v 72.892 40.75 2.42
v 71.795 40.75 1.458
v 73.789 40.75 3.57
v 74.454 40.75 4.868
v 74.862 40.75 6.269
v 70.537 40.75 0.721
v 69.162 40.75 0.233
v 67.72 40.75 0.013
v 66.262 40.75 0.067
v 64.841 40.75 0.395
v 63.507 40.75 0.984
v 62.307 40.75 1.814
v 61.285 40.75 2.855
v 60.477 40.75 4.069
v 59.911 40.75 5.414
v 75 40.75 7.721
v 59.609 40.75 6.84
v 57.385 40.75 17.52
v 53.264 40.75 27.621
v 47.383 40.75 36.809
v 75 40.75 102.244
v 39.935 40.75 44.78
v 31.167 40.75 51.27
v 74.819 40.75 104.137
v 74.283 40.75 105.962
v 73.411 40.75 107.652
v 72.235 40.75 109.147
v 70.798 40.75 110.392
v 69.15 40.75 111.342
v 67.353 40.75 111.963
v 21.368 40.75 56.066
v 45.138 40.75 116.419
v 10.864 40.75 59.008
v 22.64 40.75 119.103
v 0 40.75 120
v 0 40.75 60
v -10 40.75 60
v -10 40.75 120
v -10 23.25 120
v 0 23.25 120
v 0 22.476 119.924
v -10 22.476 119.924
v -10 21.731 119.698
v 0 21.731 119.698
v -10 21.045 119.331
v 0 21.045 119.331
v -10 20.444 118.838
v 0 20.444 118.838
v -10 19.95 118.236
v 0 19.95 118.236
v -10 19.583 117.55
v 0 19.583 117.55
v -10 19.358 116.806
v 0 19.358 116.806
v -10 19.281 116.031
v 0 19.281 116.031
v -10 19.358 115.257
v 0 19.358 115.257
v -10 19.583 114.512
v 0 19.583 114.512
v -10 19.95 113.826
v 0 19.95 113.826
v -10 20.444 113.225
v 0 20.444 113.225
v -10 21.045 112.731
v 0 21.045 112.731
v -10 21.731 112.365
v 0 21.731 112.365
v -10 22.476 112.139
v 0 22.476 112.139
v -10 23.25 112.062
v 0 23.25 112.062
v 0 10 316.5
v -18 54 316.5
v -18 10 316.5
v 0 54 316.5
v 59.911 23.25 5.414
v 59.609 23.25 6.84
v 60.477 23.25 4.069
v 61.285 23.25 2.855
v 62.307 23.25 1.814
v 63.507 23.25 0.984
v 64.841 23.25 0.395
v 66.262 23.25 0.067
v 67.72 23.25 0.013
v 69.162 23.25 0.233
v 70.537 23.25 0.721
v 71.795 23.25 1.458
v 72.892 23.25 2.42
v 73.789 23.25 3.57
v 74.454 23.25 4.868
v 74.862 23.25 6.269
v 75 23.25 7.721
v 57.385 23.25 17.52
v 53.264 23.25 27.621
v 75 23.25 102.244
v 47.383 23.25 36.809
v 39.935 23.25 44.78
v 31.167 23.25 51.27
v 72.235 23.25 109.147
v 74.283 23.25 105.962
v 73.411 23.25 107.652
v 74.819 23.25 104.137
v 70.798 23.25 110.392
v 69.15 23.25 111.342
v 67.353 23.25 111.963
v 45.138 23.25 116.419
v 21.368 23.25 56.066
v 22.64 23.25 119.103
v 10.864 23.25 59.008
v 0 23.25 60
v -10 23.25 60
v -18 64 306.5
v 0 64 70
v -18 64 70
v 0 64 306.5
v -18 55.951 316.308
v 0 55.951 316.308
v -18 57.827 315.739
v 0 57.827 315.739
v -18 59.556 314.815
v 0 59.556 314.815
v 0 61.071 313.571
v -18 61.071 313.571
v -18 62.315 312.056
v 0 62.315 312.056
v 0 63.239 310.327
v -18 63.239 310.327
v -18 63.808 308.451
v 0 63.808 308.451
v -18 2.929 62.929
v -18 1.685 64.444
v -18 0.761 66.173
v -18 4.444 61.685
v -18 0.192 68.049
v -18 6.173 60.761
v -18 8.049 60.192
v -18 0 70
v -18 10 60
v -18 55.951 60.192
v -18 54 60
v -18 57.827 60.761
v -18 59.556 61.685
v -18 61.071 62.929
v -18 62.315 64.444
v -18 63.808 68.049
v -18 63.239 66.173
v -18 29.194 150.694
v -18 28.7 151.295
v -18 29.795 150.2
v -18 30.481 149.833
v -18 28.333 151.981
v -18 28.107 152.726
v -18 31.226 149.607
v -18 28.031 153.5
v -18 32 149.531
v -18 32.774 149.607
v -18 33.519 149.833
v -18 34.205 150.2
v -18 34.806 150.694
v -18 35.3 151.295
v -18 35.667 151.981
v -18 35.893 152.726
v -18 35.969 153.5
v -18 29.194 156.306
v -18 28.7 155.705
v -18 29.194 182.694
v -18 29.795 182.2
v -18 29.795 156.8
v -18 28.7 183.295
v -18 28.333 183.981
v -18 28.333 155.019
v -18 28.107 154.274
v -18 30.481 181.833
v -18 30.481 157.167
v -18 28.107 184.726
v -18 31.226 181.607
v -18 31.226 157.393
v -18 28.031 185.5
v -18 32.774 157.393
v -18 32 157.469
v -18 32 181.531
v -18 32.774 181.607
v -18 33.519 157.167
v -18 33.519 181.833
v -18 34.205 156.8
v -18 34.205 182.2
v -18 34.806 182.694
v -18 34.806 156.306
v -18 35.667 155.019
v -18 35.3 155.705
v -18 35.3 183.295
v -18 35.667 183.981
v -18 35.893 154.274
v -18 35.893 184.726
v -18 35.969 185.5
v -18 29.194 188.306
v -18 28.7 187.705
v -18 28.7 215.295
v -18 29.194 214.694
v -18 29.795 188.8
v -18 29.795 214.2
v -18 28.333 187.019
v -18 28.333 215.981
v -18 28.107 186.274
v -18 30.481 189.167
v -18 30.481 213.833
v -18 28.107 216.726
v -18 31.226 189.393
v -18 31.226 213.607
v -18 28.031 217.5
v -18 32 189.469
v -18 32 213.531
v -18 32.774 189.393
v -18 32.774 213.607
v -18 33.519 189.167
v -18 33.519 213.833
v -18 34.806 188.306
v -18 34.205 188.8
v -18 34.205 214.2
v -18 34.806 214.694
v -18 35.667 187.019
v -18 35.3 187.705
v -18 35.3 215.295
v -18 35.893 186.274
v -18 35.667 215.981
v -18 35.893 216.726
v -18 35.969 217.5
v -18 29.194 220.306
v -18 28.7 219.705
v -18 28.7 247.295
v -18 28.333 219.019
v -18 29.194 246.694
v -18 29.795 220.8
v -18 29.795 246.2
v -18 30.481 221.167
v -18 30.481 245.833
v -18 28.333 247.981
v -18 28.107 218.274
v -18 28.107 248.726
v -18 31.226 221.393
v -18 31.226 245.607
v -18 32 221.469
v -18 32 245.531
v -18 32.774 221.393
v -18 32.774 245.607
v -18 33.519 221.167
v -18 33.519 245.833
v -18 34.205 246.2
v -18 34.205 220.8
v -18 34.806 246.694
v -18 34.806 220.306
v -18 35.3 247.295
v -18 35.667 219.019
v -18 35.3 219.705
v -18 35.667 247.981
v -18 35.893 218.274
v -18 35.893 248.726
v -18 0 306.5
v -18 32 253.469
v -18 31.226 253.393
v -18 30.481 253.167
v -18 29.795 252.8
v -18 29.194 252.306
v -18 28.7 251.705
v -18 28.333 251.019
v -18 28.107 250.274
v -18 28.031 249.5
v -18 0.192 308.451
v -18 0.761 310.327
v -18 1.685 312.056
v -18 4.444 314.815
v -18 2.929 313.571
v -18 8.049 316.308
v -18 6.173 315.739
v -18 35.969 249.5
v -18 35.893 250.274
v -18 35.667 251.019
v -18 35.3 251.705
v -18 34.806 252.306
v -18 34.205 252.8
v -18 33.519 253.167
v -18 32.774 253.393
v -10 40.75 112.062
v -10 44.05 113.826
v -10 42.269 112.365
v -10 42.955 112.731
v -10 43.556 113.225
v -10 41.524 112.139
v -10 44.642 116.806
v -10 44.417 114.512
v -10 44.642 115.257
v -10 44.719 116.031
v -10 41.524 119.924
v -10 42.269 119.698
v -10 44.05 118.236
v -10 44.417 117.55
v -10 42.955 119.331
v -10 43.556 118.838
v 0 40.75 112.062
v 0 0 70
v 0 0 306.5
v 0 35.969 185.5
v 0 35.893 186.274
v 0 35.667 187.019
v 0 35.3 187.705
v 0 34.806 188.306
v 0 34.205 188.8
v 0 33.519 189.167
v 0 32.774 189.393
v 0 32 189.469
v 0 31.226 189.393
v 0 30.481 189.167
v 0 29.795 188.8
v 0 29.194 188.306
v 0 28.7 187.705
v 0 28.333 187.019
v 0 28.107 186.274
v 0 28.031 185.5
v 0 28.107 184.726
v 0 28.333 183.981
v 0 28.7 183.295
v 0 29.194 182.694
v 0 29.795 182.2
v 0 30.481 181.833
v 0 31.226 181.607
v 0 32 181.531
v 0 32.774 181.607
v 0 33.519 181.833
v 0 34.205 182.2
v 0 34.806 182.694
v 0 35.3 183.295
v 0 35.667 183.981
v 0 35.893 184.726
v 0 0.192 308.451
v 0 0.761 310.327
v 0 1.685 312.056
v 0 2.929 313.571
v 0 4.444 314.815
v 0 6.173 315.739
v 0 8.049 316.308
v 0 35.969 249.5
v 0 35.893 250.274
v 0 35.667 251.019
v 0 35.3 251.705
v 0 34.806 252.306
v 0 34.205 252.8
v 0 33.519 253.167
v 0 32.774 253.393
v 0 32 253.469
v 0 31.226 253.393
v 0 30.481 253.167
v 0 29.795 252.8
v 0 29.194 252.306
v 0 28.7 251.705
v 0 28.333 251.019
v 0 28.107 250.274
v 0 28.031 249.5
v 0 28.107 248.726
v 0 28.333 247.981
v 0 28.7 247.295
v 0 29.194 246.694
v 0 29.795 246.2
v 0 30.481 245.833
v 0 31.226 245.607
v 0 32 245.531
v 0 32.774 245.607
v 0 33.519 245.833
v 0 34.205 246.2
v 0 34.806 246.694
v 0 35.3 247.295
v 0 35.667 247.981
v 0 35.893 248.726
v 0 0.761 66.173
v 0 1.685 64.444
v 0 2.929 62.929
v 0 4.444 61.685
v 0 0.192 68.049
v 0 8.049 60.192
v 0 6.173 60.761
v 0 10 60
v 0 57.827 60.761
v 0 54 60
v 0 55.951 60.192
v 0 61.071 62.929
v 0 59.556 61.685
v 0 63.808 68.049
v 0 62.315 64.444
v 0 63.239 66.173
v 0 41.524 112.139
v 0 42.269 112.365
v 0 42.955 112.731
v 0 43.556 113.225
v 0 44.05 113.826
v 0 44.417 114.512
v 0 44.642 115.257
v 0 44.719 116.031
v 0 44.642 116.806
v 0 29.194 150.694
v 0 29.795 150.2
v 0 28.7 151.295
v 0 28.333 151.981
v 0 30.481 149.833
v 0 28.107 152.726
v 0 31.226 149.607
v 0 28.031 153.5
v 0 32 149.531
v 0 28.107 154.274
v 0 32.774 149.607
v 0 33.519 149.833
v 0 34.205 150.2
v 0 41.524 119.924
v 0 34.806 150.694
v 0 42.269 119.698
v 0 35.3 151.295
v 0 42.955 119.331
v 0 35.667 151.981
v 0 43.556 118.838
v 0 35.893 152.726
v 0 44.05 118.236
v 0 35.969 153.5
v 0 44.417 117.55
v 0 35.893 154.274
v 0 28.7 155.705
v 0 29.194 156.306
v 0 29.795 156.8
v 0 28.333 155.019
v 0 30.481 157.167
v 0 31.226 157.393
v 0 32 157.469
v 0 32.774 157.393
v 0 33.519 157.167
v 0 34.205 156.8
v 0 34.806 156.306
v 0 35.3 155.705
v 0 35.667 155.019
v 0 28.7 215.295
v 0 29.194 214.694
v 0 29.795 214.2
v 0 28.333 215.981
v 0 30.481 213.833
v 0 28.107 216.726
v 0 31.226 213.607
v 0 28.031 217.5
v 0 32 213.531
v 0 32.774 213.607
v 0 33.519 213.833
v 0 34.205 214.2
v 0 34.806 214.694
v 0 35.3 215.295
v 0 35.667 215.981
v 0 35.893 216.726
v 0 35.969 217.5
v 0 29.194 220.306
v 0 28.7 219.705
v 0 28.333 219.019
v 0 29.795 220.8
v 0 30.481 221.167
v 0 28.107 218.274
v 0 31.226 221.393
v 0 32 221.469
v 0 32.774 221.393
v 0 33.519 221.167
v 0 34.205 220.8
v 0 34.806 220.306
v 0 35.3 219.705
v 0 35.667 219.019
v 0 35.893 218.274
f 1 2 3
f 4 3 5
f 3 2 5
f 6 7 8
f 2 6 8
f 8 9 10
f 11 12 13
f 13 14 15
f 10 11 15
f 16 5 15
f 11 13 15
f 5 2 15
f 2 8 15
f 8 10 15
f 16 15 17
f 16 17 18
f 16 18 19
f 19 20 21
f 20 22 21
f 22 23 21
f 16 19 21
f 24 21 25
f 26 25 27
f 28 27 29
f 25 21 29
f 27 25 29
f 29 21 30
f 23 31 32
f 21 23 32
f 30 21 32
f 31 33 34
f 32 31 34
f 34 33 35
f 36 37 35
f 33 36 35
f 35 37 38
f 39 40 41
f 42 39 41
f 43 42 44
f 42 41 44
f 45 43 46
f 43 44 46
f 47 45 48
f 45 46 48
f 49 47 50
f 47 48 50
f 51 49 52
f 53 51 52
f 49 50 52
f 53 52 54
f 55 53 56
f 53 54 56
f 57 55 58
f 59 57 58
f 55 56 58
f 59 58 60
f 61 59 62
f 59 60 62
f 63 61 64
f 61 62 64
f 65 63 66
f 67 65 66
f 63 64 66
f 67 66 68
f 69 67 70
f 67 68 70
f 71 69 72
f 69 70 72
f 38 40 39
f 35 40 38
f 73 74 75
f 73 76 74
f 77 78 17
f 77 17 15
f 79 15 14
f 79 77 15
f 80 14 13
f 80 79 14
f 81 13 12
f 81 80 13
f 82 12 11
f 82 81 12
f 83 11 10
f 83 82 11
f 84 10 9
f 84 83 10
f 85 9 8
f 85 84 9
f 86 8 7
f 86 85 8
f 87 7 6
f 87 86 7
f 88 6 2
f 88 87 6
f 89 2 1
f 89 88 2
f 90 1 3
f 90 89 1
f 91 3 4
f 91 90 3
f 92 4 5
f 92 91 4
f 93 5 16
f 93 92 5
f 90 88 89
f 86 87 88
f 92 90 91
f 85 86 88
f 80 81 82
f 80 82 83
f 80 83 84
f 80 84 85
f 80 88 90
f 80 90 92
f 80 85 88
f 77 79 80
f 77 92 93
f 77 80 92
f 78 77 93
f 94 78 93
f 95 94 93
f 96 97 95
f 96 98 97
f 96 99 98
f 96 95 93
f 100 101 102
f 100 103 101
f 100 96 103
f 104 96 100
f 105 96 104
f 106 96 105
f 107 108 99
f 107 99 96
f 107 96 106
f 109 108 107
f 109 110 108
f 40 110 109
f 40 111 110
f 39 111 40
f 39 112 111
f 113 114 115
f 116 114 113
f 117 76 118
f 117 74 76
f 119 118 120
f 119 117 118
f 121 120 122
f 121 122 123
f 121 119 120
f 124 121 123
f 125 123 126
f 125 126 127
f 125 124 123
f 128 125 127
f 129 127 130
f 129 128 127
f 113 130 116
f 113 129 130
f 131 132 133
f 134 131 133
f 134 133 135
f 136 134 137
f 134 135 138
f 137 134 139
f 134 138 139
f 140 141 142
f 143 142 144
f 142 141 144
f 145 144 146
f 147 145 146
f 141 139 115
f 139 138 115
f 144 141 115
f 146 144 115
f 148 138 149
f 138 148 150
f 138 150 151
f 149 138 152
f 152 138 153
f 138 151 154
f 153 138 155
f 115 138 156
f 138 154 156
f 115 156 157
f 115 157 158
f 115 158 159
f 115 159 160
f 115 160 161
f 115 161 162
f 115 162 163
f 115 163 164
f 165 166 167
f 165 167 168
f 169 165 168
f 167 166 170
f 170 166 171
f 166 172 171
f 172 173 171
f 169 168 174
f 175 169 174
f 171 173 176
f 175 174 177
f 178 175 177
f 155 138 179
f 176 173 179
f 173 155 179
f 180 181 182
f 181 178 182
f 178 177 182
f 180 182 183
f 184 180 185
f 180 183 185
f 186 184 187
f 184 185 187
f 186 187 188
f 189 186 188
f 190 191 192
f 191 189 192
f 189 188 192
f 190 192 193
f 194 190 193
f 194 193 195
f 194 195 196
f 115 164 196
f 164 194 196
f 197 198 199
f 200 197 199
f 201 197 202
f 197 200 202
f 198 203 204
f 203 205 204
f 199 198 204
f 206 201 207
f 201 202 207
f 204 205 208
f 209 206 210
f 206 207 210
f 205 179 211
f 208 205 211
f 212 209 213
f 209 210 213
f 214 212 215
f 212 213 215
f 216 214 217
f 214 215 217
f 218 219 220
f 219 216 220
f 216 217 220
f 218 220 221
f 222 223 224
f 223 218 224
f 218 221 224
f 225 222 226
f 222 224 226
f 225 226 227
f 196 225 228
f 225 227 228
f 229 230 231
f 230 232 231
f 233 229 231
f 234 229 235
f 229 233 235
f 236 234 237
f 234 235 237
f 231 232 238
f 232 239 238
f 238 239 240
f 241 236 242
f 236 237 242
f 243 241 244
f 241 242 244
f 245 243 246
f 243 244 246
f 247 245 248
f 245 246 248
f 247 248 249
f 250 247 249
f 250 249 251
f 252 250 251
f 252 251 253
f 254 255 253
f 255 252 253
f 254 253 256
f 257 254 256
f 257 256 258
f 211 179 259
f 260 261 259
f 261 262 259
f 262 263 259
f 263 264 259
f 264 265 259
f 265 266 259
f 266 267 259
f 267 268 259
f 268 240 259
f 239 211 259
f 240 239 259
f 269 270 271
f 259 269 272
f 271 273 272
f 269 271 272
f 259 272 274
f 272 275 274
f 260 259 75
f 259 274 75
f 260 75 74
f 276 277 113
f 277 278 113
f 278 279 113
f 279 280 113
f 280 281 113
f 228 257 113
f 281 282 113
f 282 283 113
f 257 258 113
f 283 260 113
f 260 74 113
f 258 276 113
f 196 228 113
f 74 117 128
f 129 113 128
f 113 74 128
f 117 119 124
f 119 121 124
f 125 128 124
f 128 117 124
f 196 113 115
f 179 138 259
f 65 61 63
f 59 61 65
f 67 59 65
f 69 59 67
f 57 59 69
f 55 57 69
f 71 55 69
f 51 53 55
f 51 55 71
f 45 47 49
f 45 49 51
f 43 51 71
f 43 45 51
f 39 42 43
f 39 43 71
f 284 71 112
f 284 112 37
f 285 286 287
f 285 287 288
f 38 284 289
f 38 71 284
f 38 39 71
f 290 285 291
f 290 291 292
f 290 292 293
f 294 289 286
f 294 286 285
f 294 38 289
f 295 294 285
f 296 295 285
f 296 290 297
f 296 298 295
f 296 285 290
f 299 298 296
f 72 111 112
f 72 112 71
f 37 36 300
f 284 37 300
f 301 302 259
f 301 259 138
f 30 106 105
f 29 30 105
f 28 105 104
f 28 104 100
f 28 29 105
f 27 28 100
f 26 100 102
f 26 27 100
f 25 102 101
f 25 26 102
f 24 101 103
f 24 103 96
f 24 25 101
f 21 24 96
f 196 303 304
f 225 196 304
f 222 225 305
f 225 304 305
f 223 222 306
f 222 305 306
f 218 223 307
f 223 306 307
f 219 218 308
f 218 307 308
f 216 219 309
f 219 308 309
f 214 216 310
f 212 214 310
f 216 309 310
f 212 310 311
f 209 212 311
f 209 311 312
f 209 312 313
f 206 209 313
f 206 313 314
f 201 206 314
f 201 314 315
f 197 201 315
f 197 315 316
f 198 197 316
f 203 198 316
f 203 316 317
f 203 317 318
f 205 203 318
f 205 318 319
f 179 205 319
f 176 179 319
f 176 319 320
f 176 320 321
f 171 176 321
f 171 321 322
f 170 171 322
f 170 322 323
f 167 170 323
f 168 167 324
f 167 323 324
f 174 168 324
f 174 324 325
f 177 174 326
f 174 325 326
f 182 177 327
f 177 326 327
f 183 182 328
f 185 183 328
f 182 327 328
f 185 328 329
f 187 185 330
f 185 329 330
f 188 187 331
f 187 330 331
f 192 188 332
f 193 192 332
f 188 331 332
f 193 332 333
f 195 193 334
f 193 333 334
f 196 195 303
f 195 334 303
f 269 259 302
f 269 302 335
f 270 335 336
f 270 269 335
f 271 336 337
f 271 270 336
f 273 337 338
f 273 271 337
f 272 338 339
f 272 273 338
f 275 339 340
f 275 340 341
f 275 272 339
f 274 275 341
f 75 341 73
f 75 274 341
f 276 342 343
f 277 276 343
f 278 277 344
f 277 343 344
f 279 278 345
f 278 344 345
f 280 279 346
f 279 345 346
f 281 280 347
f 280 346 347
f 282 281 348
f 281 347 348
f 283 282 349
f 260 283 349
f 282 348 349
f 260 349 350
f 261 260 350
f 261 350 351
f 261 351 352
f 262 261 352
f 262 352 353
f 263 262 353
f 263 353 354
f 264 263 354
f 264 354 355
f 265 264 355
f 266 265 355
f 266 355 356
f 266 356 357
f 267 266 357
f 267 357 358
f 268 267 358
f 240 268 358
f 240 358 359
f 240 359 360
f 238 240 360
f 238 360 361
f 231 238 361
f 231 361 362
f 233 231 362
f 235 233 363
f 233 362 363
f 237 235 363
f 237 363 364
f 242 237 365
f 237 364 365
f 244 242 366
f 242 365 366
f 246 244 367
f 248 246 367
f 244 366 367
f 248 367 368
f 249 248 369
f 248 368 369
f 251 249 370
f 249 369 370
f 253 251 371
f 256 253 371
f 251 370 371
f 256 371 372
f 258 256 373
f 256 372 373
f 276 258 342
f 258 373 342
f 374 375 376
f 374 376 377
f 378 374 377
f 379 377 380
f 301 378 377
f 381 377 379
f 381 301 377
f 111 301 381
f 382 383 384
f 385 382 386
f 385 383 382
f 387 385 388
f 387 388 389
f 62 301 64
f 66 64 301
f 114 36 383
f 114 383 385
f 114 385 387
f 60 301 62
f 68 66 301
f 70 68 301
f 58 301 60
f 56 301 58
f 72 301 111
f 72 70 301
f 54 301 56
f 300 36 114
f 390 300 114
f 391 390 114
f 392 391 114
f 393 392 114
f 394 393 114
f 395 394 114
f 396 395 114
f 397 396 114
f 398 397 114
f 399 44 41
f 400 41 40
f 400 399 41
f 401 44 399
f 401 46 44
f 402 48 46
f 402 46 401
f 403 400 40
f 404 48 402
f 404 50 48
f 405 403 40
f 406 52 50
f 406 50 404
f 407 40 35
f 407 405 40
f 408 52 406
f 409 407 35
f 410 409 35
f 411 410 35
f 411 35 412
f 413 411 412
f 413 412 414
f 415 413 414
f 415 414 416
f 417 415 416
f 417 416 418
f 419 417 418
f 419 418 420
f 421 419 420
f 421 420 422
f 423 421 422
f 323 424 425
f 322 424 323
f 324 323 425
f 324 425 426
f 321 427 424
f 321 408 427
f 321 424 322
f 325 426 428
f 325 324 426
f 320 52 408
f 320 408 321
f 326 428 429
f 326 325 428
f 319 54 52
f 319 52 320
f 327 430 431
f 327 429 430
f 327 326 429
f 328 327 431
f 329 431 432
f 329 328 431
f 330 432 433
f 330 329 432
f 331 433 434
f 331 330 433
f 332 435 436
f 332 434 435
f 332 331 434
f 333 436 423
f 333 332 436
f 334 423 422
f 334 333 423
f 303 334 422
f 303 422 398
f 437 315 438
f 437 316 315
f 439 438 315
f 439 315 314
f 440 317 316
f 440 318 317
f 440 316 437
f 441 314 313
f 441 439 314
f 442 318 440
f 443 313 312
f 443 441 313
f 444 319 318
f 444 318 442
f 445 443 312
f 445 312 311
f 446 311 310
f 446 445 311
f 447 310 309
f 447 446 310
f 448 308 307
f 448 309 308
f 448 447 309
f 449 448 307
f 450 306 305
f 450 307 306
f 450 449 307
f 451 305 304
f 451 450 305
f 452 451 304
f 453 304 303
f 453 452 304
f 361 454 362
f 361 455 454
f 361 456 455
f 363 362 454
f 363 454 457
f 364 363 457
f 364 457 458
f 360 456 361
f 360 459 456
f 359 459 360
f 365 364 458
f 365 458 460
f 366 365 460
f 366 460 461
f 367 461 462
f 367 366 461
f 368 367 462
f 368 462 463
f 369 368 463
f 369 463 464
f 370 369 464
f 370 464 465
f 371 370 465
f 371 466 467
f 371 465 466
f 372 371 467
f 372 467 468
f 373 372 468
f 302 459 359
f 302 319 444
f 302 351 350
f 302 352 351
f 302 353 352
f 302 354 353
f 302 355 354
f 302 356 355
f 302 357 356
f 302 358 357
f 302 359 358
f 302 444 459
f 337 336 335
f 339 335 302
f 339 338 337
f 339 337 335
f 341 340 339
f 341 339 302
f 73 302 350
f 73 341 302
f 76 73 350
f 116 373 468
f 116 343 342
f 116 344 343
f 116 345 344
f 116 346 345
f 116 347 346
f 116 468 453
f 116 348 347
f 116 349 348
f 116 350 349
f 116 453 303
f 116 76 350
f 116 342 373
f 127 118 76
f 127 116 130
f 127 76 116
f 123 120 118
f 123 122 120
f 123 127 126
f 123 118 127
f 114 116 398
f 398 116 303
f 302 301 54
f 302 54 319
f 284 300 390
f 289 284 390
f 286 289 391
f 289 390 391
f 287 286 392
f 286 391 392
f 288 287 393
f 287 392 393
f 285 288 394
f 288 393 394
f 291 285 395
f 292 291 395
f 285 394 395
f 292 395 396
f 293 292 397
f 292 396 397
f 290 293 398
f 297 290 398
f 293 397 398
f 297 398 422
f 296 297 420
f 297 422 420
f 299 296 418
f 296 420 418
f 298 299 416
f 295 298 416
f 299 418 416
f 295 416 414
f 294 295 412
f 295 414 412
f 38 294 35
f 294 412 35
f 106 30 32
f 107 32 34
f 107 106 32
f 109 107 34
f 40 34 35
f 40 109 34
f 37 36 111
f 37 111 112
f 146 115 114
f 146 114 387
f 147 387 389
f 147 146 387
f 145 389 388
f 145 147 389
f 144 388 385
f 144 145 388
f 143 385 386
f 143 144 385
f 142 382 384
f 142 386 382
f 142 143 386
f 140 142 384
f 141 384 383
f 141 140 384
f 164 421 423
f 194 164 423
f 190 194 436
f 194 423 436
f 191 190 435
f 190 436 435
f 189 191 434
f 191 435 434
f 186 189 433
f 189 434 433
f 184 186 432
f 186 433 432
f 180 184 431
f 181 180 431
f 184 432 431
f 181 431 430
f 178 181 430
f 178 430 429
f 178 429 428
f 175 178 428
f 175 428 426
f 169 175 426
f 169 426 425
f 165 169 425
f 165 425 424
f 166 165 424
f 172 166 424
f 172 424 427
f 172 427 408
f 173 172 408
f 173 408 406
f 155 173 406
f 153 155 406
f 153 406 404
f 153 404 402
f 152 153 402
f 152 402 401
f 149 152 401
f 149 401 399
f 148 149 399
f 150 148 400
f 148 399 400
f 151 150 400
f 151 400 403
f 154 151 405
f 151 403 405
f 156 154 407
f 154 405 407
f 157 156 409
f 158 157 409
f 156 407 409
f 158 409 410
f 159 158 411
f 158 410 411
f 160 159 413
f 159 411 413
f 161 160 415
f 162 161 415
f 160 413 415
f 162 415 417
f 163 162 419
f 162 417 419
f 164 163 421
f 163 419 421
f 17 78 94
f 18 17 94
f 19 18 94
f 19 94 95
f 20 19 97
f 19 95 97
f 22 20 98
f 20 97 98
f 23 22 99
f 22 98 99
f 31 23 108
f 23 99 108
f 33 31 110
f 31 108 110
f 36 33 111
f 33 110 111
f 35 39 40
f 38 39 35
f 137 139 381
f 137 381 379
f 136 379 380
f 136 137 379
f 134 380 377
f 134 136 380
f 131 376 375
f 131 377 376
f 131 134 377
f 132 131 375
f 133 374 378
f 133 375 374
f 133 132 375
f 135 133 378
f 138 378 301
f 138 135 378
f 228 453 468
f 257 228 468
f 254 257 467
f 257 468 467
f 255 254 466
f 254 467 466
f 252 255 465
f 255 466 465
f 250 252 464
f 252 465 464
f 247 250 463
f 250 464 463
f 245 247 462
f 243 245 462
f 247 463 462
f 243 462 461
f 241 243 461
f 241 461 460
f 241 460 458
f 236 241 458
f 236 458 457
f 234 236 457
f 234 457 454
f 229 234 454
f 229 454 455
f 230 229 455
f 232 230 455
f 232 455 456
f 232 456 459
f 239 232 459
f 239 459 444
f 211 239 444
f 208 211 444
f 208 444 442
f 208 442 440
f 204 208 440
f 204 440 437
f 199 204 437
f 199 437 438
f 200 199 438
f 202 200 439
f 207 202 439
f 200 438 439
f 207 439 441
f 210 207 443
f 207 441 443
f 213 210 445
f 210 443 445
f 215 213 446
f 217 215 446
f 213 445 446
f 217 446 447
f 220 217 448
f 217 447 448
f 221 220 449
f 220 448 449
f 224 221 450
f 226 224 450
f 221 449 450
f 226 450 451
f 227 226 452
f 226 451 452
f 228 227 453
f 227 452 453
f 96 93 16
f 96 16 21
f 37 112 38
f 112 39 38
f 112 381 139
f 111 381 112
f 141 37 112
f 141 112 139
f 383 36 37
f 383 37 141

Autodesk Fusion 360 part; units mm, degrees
sketch "Sketch1" plane through (0, 0, 0) normal (1, 0, 0) x (0, 1, 0)
  line L0 (0, 60) -> (64, 60)
  line L1 (64, 60) -> (64, 316.5)
  line L2 (64, 316.5) -> (0, 316.5)
  line L3 (0, 316.5) -> (0, 60)
  line L4 (0, 0) -> (0, 60) construction
  line L5 (32, 316.5) -> (32, 60) construction
  circle A0 centre (32, 153.5) radius 3.9688
  circle A1 centre (32, 185.5) radius 3.9688
  circle A2 centre (32, 217.5) radius 3.9688
  circle A3 centre (32, 249.5) radius 3.9688
  line L6 (23.25, 60) -> (23.25, 112.0625)
  arc A4 (23.25, 120) -> (23.25, 112.0625) centre (23.25, 116.0312) ccw
  line L7 (23.25, 120) -> (40.75, 120)
  line L8 (40.75, 60) -> (40.75, 112.0625)
  arc A5 (40.75, 112.0625) -> (40.75, 120) centre (40.75, 116.0312) ccw
  line L9 (40.75, 86.0312) -> (32, 86.0312) construction
  line L10 (32, 86.0312) -> (23.25, 86.0312) construction
  line L11 (23.25, 60) -> (23.25, 0)
  line L12 (23.25, 0) -> (40.75, 0)
  line L13 (40.75, 0) -> (40.75, 60)
  line L14 (40.75, 112.0625) -> (40.75, 120)
  line L15 (23.25, 112.0625) -> (23.25, 120)
  dimension "d1" = 32
  dimension "d2" = 7.9375
  dimension "d5" = 0
  dimension "d6" = 32
  dimension "d7" = 153.5
  dimension "d8" = 67
  dimension "d9" = 60
  dimension "d11" = 17.5
  dimension "d12" = 120
  dimension "d13" = 33.5
extrude "Extrude1" add sketch "Sketch1" against normal blind 18 contours L0 L1 L2 L3 L6 A4 L7 L8 A5 makes body 1
extrude "Extrude2" add sketch "Sketch1" along normal blind 8 from surface at -18 contours L0 L6 L7 L8 L14 L15 | A4 L15 | A5 L14 bodies 1
extrude "Extrude3" add sketch "Sketch1" along normal blind 120 from surface at -10 separate body contours L0 L6 L7 L8 L14 L15 | L0 L11 L12 L13 makes body 2
sketch "Sketch2" plane through (0, 23.25, 0) normal (0, -1, 0) x (1, 0, 0)
  line L0 (-10, 120) -> (-10, 0)
  line L1 (-10, 0) -> (110, 0)
  line L2 (110, 0) -> (110, 120)
  line L3 (110, 120) -> (-10, 120)
  arc A0 (60, 0) -> (0, 60) centre (0, 0) ccw
  line L4 (0, 60) -> (-10, 60)
  line L5 (0, 60) -> (75, 60) construction
  line L6 (75, 0) -> (75, 110)
  arc A1 (75, 110) -> (0, 120) centre (0, -166.25) ccw
  arc A2 (59.6088, 6.8405) -> (75, 7.7208) centre (67.2792, 7.7208) ccw
  point P0 (0, 60)
  point P1 (0, 120)
  dimension "d24" = 50
  dimension "d25" = 15
extrude "Extrude4" cut sketch "Sketch2" against normal through all contours L0 L1 A0 L4 | L1 L2 L3 L6 A1 | L1 A0 A2 | L1 L6 A2 bodies 2
fillet "Fillet1" radius 10 5 edges at (-9, 0, 316.5) (-9, 64, 316.5) (-9, 0, 60) (-9, 64, 60) (75, 32, 110) on bodies 1 2
equation "d2 = 5/16\""
equation "d8 = d1 + 35 mm"
